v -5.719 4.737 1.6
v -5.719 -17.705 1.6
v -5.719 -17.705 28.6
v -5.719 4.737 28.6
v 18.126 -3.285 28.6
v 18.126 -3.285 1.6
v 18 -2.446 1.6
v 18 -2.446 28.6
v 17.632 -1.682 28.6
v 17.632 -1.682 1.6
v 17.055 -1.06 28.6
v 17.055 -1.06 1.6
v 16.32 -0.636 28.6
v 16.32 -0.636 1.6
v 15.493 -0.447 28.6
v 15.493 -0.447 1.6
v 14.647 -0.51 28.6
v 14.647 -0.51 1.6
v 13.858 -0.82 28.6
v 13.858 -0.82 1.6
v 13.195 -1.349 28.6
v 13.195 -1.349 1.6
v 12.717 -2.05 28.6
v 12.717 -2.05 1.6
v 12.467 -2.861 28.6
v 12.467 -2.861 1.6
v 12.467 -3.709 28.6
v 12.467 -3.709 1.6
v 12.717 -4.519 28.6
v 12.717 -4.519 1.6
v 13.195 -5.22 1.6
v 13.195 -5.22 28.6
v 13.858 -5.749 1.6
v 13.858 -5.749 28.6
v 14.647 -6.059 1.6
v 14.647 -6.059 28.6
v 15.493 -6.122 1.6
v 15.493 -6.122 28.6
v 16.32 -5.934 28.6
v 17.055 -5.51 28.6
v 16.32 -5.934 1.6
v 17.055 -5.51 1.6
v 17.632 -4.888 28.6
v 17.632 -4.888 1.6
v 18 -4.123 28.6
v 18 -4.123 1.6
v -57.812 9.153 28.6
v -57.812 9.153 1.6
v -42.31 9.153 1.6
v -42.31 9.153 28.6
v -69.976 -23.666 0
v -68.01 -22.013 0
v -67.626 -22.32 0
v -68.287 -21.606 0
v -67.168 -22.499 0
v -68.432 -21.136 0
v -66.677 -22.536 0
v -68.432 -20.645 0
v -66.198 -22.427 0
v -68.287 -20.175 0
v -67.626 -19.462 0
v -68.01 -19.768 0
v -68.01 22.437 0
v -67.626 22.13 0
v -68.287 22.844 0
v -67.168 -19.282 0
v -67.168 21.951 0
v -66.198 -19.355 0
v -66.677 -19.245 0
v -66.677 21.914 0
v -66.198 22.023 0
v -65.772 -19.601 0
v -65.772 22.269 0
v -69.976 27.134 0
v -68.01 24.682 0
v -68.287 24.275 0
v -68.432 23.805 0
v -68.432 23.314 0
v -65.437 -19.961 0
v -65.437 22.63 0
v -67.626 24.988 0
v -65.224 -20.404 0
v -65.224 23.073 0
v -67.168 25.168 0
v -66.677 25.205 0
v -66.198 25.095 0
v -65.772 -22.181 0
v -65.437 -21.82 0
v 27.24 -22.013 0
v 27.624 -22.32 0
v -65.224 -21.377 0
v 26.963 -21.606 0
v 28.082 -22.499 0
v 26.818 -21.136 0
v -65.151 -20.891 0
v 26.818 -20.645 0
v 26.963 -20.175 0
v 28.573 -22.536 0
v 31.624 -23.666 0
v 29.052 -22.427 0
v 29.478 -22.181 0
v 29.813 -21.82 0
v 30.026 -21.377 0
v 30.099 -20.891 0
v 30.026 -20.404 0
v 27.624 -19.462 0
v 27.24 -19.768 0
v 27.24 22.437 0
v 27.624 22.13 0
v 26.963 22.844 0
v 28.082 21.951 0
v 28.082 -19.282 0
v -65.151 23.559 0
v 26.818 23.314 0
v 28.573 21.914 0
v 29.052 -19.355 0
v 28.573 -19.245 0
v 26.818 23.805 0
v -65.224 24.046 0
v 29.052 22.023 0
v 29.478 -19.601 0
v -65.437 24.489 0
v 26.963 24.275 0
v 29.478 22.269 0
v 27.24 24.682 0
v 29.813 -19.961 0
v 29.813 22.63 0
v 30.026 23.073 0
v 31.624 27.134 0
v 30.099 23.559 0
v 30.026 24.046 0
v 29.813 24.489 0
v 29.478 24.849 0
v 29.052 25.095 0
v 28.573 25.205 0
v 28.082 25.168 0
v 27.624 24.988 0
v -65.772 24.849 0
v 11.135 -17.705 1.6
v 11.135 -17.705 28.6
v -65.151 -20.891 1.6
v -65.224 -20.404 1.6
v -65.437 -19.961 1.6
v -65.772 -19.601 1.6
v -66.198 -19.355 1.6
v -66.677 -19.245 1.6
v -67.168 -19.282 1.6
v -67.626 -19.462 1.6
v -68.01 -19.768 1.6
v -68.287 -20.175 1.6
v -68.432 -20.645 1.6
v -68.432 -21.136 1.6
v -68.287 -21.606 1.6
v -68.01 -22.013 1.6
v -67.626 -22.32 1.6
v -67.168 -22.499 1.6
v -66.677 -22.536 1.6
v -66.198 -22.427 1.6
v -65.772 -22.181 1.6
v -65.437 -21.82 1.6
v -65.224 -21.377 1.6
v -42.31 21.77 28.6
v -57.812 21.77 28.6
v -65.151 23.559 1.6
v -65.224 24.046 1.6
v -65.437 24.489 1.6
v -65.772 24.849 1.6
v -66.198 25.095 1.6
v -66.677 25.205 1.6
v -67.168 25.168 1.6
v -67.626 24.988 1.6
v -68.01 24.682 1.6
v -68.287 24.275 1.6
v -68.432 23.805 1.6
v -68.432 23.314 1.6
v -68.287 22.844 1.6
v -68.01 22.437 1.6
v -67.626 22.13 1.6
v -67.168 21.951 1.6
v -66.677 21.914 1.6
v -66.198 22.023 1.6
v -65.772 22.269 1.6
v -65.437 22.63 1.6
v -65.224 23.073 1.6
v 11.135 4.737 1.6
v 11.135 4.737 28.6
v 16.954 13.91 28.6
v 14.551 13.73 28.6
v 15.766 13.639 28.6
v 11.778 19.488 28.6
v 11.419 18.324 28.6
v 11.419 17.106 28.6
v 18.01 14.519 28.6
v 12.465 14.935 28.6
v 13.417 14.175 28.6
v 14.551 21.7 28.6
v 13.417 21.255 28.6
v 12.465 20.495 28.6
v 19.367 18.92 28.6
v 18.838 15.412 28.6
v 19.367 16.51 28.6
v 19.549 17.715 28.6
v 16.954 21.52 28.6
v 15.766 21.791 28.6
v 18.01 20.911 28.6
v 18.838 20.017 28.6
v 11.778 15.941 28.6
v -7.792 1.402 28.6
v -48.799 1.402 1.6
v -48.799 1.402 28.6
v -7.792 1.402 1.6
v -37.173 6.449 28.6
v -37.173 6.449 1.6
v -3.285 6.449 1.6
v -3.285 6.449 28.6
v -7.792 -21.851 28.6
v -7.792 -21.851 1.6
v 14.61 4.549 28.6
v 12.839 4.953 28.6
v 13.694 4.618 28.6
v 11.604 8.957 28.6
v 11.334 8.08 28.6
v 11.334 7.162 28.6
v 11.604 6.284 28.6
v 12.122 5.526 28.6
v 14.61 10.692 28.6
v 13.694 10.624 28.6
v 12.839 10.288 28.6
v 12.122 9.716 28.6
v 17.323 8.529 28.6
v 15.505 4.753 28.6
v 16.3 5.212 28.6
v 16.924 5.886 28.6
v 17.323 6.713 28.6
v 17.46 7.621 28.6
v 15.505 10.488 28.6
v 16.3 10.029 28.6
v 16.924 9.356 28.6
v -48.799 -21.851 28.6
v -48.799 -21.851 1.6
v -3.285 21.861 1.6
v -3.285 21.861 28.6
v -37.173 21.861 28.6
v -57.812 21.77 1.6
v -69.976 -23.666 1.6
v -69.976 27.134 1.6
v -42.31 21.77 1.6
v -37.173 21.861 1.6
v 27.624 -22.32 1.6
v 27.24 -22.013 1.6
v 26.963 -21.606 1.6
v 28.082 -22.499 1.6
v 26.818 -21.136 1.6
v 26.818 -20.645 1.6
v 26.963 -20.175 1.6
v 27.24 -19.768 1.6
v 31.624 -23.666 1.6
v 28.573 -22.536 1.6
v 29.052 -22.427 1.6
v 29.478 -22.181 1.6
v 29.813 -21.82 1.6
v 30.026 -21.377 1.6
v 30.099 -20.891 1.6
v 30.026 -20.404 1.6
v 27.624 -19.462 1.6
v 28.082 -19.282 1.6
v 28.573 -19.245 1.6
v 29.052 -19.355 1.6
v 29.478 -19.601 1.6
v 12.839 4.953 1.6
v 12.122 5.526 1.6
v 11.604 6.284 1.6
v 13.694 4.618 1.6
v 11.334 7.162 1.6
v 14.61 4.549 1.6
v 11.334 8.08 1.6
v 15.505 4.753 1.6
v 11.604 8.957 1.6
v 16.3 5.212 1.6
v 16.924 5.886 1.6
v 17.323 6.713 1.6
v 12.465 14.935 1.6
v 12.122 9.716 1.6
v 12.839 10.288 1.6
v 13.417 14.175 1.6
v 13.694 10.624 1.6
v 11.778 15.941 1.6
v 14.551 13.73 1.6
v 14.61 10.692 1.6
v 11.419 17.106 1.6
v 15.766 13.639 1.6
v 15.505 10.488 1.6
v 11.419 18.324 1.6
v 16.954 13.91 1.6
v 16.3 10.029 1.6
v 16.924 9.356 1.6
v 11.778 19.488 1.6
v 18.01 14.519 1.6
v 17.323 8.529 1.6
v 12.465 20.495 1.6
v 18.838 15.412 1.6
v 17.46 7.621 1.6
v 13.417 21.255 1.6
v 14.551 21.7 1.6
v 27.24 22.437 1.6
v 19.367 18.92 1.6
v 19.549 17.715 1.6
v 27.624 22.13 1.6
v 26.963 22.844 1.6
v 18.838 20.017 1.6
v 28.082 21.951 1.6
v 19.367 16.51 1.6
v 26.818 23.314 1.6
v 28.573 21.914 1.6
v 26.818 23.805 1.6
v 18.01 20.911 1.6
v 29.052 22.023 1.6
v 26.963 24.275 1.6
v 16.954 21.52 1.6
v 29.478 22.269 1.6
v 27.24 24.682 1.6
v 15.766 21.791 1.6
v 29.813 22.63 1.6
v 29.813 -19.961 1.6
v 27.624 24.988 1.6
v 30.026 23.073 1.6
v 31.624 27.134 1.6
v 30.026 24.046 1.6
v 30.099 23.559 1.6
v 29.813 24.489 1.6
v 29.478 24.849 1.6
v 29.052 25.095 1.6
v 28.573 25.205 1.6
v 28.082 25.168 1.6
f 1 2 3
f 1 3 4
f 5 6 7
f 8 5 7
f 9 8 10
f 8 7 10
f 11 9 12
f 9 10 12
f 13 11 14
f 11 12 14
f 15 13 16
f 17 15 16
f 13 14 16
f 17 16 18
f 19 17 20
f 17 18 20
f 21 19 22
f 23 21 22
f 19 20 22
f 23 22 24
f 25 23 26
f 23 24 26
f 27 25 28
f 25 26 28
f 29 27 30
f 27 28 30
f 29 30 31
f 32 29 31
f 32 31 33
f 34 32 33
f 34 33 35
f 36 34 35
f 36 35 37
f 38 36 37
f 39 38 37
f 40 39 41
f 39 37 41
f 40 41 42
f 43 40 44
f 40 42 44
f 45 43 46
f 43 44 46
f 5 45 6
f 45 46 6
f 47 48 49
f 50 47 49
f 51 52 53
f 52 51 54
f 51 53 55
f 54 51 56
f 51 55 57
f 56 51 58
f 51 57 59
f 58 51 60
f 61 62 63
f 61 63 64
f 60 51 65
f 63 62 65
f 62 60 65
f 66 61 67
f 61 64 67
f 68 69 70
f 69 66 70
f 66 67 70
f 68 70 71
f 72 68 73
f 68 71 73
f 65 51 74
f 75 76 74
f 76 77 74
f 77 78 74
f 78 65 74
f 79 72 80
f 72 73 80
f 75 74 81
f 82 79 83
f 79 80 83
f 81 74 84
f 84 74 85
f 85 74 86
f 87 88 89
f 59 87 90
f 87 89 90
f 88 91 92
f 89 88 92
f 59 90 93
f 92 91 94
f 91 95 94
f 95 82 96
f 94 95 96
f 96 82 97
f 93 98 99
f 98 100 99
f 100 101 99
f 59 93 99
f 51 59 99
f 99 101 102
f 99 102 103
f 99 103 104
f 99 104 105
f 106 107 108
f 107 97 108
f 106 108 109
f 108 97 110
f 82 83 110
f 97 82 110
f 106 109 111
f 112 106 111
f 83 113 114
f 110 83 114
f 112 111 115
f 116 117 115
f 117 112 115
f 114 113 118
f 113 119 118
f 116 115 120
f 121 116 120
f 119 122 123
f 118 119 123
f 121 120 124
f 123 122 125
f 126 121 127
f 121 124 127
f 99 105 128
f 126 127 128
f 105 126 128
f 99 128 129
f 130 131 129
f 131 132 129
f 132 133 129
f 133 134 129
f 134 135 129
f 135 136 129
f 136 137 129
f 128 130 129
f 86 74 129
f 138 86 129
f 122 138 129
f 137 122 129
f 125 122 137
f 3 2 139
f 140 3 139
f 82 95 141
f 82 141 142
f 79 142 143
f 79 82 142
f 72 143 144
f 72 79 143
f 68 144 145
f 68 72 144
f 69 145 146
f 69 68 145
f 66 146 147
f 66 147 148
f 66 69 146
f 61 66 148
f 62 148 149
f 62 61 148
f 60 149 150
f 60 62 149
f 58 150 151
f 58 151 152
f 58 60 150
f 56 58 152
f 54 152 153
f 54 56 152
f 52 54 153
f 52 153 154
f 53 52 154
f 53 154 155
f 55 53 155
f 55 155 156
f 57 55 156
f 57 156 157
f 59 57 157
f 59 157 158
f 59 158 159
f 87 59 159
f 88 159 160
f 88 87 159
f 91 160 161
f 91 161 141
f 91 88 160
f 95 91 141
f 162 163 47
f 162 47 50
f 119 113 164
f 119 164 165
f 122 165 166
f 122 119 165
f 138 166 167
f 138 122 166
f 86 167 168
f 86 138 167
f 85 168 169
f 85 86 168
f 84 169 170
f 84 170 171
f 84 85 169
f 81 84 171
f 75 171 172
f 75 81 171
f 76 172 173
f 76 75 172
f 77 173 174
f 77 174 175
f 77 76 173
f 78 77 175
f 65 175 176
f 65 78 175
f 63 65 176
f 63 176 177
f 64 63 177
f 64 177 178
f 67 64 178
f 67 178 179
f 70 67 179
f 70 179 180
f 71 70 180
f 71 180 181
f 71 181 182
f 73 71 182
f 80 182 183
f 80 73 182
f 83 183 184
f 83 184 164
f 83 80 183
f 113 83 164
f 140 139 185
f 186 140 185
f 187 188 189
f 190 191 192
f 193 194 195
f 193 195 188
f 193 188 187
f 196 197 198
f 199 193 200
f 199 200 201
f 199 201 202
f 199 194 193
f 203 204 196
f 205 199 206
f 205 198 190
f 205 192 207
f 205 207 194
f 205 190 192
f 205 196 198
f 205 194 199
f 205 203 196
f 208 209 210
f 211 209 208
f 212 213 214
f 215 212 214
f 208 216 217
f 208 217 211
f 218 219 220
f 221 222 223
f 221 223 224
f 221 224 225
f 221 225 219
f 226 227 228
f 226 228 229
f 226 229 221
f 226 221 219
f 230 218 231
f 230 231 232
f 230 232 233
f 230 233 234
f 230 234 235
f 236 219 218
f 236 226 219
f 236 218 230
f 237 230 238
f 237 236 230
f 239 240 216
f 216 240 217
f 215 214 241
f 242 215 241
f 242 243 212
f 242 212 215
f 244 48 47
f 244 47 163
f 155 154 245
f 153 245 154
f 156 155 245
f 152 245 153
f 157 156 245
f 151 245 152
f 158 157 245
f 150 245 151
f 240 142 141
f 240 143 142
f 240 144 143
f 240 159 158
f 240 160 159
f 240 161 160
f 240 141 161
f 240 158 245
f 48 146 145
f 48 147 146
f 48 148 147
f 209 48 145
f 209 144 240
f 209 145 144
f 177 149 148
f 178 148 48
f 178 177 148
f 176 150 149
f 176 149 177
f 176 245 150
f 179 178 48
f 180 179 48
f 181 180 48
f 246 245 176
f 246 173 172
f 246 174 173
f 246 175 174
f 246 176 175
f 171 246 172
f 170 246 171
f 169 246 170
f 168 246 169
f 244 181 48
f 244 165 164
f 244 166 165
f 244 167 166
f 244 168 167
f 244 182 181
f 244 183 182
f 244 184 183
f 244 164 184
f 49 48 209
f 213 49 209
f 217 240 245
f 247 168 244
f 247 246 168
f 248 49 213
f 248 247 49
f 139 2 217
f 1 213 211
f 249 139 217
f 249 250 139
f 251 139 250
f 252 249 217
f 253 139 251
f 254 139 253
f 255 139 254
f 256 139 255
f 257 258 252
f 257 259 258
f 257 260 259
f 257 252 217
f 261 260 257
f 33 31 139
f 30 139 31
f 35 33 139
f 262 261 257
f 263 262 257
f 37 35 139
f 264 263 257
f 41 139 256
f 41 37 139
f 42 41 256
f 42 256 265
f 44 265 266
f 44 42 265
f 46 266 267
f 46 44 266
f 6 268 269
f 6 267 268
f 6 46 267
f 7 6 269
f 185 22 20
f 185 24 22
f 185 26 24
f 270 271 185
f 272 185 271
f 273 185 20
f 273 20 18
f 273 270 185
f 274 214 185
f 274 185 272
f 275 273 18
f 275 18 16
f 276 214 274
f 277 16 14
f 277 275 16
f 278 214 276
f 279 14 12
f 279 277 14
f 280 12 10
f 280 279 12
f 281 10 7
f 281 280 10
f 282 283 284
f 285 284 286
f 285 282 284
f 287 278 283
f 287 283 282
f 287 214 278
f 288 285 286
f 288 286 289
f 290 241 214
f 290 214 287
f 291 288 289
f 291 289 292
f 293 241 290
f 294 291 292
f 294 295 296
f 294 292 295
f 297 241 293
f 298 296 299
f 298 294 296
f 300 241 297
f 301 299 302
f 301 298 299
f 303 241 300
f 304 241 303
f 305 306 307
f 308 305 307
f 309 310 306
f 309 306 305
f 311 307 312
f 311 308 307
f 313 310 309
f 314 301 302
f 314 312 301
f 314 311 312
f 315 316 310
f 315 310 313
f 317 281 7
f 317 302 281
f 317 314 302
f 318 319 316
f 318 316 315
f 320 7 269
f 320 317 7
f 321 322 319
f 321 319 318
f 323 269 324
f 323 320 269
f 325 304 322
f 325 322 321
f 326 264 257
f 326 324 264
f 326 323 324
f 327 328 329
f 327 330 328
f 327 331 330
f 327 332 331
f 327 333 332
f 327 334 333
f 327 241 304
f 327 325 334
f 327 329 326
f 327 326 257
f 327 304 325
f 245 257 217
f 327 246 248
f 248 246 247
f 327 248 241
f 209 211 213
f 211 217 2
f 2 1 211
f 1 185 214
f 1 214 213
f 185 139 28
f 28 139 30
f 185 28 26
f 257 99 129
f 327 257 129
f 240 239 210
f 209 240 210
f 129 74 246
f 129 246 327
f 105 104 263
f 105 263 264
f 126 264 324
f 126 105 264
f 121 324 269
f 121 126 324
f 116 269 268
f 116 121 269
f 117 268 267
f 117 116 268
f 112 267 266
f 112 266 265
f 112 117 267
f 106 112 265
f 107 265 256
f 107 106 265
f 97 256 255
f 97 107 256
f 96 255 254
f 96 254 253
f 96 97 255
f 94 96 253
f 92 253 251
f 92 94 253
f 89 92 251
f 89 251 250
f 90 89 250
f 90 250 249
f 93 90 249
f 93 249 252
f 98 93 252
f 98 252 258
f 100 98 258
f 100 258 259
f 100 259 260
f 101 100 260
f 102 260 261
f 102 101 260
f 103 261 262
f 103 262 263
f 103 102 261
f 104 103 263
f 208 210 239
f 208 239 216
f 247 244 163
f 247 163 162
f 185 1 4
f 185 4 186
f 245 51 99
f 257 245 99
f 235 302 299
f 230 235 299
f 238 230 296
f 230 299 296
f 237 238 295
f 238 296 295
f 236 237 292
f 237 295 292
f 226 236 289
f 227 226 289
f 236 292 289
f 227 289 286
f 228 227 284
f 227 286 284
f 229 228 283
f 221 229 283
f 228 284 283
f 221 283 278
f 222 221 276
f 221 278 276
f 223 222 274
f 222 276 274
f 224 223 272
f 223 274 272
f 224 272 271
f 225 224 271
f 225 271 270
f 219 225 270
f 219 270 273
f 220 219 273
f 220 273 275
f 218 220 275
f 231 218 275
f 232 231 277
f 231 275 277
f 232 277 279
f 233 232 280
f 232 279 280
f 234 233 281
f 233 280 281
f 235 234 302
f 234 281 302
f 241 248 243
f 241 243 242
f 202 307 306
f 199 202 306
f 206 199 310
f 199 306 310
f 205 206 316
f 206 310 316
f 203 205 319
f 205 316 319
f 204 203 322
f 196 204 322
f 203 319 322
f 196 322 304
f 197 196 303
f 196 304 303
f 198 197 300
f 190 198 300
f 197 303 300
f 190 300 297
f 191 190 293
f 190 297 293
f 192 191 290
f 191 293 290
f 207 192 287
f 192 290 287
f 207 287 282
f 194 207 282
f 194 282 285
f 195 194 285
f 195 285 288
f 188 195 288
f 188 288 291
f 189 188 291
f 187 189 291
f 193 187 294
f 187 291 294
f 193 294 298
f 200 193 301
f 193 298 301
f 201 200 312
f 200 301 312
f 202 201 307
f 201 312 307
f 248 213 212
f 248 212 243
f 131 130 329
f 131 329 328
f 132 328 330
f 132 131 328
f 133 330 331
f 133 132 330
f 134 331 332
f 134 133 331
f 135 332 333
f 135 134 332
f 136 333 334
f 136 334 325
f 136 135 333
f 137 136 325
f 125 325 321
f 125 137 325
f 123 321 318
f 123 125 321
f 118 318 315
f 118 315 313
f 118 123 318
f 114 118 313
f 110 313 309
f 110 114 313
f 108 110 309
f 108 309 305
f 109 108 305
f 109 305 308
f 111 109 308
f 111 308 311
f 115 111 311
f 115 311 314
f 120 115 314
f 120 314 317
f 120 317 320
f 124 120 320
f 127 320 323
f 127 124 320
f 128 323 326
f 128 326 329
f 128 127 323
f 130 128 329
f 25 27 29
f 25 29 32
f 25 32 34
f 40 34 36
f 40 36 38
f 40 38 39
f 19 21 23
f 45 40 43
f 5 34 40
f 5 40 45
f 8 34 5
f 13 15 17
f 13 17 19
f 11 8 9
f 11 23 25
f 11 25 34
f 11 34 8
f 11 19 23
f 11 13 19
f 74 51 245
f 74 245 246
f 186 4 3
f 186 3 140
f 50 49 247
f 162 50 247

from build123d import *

# Parameters (mm, degrees)
F0_W     = 101.6
F0_H     = 50.8
F0_R     = 1.65
F1_DEPTH = 1.6
F2_W     = 15.501738
F2_H     = 12.617692
F2_W_2   = 33.887516
F2_H_2   = 15.411611
F2_W_3   = 41.007504
F2_H_3   = 23.252605
F2_W_4   = 16.853633
F2_H_4   = 22.441468
F2_R     = 4.087607
F2_R_2   = 3.08016
F2_R_3   = 2.845767
F3_DEPTH = 27


with BuildPart() as f1:
    # F0 (on Top) → F1 (new body)
    with BuildSketch(Plane.XY):
        with Locations((-19.175592, 1.734423)):
            Rectangle(F0_W, F0_H)
        with Locations((-66.800592, -20.890577)):
            Circle(F0_R, mode=Mode.SUBTRACT)
        with Locations((28.449408, -20.890577)):
            Circle(F0_R, mode=Mode.SUBTRACT)
        with Locations((-66.800592, 23.559423)):
            Circle(F0_R, mode=Mode.SUBTRACT)
        with Locations((28.449408, 23.559423)):
            Circle(F0_R, mode=Mode.SUBTRACT)
    extrude(amount=F1_DEPTH)

    # F2 (on face) → F3 (join)
    with BuildSketch(Plane.XY.offset(1.6)):
        with Locations((-50.060928, 15.461646)):
            Rectangle(F2_W, F2_H)
        with Locations((-20.229096, 14.154814)):
            Rectangle(F2_W_2, F2_H_2)
        with Locations((-28.295409, -10.224371)):
            Rectangle(F2_W_3, F2_H_3)
        with Locations((2.708067, -6.484127)):
            Rectangle(F2_W_4, F2_H_4)
        with Locations((15.460948, 17.714806)):
            Circle(F2_R)
        with Locations((14.379433, 7.620651)):
            Circle(F2_R_2)
        with Locations((15.280697, -3.28464)):
            Circle(F2_R_3)
    extrude(amount=F3_DEPTH)


solid = f1.part
